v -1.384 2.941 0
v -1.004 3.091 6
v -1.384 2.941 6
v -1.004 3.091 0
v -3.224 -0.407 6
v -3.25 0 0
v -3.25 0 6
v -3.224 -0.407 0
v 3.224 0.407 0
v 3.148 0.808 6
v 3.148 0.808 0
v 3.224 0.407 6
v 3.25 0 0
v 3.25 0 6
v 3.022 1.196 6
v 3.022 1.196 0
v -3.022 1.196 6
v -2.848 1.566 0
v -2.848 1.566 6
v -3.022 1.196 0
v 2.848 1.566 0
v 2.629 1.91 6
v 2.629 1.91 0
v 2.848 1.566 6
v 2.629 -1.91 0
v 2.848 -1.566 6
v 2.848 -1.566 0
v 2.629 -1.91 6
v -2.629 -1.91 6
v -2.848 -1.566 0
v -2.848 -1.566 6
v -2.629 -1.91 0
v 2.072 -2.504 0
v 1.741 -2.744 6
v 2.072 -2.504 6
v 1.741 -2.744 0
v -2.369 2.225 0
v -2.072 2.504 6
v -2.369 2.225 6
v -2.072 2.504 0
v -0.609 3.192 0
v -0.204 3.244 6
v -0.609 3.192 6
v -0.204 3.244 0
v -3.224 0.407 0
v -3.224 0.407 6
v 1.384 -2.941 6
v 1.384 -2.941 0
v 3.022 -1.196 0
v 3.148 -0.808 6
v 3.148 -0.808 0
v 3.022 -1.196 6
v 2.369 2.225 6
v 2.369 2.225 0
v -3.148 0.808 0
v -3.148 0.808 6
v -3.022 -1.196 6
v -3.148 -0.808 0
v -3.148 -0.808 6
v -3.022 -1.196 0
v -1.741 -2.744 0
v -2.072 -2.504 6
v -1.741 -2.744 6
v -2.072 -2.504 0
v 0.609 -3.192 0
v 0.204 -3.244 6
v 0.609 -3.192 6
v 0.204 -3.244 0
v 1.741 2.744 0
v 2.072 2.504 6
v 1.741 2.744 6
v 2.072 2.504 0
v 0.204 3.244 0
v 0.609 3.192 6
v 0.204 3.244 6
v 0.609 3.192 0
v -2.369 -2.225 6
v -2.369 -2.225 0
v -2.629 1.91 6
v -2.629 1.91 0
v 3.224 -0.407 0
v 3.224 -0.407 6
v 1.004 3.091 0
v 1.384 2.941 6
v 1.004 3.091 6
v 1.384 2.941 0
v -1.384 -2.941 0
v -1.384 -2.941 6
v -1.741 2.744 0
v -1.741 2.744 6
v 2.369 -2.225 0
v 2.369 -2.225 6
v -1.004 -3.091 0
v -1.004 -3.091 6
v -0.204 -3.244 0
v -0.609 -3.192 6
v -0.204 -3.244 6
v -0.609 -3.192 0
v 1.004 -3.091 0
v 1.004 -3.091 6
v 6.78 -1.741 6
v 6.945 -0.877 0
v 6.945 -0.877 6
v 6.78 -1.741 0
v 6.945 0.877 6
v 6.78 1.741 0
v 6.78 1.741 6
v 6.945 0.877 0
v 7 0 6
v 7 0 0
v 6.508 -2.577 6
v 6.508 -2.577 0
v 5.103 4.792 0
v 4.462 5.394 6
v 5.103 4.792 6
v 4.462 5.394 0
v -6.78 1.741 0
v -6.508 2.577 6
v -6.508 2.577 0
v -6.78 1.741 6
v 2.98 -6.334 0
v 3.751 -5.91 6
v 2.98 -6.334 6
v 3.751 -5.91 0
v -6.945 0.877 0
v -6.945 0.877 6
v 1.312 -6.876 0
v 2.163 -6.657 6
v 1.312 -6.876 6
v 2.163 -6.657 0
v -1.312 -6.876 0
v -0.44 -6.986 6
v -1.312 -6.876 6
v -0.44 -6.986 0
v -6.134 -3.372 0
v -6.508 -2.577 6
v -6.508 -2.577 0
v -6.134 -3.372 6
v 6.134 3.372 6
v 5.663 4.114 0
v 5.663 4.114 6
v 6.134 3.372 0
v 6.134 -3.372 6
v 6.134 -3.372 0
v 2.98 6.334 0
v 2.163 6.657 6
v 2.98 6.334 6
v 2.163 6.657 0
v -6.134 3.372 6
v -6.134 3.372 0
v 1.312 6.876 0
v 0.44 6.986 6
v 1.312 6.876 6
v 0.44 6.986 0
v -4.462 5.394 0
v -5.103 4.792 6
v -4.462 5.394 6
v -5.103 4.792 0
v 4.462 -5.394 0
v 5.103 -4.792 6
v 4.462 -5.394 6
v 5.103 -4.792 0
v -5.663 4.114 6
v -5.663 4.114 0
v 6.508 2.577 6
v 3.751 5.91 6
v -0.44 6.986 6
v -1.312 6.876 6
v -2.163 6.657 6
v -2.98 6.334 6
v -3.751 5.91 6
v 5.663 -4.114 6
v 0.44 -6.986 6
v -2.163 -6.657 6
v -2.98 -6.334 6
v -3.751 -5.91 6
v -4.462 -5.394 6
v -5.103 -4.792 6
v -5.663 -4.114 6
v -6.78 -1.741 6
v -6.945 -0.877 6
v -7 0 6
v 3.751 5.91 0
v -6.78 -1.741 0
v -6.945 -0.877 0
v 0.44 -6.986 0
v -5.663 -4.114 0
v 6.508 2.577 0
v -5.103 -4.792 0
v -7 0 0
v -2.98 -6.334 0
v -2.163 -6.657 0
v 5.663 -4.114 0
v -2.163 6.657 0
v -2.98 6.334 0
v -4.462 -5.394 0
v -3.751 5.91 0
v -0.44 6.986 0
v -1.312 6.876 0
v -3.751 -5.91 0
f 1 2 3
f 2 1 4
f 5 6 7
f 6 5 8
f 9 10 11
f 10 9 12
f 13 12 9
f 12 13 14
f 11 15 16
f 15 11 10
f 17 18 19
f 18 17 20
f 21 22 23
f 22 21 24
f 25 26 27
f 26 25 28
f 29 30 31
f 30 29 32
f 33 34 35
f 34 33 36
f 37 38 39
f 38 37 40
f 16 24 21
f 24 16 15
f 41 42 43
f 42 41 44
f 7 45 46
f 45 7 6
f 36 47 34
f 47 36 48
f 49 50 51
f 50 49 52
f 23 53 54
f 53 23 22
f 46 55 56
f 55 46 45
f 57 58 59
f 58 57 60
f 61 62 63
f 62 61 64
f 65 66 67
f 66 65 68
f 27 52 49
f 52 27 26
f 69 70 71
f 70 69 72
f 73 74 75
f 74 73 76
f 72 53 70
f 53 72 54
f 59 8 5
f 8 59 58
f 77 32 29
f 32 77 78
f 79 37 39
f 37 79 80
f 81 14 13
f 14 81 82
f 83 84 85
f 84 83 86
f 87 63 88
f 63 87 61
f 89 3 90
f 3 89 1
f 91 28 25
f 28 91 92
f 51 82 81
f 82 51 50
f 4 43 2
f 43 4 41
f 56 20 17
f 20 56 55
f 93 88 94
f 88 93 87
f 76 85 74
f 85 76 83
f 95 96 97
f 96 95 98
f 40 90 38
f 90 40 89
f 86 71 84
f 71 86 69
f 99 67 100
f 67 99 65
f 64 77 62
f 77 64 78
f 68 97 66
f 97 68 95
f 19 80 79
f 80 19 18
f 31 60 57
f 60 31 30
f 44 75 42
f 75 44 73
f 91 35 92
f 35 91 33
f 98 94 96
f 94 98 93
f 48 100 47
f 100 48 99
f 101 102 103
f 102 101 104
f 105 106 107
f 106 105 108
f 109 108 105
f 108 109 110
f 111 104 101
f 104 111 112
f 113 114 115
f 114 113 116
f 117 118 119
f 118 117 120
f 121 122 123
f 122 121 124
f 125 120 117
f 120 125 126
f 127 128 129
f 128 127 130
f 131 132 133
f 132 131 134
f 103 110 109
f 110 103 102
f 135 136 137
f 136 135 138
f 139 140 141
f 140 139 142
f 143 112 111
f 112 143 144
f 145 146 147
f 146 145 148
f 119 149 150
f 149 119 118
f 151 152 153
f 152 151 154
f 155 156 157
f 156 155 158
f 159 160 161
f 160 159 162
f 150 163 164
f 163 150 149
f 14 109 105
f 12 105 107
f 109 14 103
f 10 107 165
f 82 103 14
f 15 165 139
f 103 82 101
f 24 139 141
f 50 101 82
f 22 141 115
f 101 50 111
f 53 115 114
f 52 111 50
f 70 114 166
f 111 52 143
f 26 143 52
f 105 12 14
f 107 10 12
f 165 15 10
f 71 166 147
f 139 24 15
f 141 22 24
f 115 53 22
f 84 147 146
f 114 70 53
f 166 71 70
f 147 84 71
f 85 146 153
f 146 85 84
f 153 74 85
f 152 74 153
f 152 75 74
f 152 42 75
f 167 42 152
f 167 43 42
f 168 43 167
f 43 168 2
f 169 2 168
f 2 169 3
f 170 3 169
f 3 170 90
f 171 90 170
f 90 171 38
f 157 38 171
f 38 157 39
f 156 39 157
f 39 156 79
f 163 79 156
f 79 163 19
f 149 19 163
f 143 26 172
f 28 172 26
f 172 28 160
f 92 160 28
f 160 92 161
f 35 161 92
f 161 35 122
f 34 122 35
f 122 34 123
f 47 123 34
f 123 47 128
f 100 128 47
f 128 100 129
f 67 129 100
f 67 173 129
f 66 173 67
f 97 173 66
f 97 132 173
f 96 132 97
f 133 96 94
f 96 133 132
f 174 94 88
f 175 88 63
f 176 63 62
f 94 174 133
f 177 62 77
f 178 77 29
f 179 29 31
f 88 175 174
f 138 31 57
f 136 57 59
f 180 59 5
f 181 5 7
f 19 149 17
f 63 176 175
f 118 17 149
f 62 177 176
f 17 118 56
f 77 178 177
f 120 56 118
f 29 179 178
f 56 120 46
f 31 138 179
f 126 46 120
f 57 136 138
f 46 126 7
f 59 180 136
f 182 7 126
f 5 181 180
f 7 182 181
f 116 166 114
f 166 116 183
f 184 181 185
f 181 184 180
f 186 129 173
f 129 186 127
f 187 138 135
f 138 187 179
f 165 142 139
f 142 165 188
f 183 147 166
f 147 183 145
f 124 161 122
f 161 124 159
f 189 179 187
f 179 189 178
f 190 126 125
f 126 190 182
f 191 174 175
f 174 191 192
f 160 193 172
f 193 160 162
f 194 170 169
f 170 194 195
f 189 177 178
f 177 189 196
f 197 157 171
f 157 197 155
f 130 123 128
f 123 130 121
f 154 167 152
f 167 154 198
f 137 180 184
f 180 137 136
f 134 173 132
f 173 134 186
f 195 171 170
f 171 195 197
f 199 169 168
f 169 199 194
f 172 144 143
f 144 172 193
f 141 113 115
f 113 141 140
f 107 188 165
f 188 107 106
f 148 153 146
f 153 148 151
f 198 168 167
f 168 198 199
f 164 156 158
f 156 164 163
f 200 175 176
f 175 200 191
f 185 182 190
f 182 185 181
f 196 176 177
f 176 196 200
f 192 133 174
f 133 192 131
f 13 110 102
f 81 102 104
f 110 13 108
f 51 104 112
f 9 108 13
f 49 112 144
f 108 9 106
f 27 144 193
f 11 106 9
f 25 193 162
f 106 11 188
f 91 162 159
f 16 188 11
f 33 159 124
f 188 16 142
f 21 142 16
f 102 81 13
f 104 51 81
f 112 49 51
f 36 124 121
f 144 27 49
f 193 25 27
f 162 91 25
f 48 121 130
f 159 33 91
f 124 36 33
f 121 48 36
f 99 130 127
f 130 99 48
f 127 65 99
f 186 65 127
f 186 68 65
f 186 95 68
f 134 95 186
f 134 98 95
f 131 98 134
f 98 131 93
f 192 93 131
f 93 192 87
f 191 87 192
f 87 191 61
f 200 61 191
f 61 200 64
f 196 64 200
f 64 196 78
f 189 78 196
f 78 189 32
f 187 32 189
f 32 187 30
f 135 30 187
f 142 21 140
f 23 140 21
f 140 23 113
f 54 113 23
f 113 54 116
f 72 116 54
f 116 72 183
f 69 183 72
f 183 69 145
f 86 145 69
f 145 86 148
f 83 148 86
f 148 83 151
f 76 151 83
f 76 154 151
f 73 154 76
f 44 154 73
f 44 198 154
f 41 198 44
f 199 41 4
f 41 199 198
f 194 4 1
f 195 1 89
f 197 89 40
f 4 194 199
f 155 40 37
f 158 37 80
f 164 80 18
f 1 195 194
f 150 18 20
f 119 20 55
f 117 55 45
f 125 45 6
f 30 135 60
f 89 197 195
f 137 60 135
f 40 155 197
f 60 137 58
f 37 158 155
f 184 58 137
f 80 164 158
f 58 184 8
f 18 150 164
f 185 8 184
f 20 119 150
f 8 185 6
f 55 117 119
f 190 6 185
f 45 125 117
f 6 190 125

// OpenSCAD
$fn = 50;


difference() {
	union() {
		*color(alpha = 1.0000000000, c = "gray") {
			translate(v = [0, 7, 0]) {
				linear_extrude(height = 1) {
					text(font = "Arial:style=Bold", halign = "center", size = 4.5000000000, text = "COMMENT plate main", valign = "center");
				}
			}
		}
		*color(alpha = 1.0000000000, c = "gray") {
			translate(v = [0, 14, 0]) {
				linear_extrude(height = 1) {
					text(font = "Arial:style=Bold", halign = "center", size = 4.5000000000, text = "COMMENT description oobb_plate_shape_p_type_6_depth_1_width_1_height_6_thickness_true_both_holes", valign = "center");
				}
			}
		}
		cylinder(h = 6, r = 7.0000000000);
	}
	union() {
		*color(alpha = 1.0000000000, c = "gray") {
			translate(v = [0, 7, 0]) {
				linear_extrude(height = 1) {
					text(font = "Arial:style=Bold", halign = "center", size = 4.5000000000, text = "COMMENT holes main", valign = "center");
				}
			}
		}
		*color(alpha = 1.0000000000, c = "gray") {
			translate(v = [0, 14, 0]) {
				linear_extrude(height = 1) {
					text(font = "Arial:style=Bold", halign = "center", size = 4.5000000000, text = "COMMENT description oobb_holes_shape_n_type_1_width_1_height_6_thickness_true_both_holes", valign = "center");
				}
			}
		}
		translate(v = [0, 0, -50]) {
			cylinder(h = 100, r = 3.2500000000);
		}
		translate(v = [0, 0, -50]) {
			cylinder(h = 100, r = 1.8000000000);
		}
	}
}
